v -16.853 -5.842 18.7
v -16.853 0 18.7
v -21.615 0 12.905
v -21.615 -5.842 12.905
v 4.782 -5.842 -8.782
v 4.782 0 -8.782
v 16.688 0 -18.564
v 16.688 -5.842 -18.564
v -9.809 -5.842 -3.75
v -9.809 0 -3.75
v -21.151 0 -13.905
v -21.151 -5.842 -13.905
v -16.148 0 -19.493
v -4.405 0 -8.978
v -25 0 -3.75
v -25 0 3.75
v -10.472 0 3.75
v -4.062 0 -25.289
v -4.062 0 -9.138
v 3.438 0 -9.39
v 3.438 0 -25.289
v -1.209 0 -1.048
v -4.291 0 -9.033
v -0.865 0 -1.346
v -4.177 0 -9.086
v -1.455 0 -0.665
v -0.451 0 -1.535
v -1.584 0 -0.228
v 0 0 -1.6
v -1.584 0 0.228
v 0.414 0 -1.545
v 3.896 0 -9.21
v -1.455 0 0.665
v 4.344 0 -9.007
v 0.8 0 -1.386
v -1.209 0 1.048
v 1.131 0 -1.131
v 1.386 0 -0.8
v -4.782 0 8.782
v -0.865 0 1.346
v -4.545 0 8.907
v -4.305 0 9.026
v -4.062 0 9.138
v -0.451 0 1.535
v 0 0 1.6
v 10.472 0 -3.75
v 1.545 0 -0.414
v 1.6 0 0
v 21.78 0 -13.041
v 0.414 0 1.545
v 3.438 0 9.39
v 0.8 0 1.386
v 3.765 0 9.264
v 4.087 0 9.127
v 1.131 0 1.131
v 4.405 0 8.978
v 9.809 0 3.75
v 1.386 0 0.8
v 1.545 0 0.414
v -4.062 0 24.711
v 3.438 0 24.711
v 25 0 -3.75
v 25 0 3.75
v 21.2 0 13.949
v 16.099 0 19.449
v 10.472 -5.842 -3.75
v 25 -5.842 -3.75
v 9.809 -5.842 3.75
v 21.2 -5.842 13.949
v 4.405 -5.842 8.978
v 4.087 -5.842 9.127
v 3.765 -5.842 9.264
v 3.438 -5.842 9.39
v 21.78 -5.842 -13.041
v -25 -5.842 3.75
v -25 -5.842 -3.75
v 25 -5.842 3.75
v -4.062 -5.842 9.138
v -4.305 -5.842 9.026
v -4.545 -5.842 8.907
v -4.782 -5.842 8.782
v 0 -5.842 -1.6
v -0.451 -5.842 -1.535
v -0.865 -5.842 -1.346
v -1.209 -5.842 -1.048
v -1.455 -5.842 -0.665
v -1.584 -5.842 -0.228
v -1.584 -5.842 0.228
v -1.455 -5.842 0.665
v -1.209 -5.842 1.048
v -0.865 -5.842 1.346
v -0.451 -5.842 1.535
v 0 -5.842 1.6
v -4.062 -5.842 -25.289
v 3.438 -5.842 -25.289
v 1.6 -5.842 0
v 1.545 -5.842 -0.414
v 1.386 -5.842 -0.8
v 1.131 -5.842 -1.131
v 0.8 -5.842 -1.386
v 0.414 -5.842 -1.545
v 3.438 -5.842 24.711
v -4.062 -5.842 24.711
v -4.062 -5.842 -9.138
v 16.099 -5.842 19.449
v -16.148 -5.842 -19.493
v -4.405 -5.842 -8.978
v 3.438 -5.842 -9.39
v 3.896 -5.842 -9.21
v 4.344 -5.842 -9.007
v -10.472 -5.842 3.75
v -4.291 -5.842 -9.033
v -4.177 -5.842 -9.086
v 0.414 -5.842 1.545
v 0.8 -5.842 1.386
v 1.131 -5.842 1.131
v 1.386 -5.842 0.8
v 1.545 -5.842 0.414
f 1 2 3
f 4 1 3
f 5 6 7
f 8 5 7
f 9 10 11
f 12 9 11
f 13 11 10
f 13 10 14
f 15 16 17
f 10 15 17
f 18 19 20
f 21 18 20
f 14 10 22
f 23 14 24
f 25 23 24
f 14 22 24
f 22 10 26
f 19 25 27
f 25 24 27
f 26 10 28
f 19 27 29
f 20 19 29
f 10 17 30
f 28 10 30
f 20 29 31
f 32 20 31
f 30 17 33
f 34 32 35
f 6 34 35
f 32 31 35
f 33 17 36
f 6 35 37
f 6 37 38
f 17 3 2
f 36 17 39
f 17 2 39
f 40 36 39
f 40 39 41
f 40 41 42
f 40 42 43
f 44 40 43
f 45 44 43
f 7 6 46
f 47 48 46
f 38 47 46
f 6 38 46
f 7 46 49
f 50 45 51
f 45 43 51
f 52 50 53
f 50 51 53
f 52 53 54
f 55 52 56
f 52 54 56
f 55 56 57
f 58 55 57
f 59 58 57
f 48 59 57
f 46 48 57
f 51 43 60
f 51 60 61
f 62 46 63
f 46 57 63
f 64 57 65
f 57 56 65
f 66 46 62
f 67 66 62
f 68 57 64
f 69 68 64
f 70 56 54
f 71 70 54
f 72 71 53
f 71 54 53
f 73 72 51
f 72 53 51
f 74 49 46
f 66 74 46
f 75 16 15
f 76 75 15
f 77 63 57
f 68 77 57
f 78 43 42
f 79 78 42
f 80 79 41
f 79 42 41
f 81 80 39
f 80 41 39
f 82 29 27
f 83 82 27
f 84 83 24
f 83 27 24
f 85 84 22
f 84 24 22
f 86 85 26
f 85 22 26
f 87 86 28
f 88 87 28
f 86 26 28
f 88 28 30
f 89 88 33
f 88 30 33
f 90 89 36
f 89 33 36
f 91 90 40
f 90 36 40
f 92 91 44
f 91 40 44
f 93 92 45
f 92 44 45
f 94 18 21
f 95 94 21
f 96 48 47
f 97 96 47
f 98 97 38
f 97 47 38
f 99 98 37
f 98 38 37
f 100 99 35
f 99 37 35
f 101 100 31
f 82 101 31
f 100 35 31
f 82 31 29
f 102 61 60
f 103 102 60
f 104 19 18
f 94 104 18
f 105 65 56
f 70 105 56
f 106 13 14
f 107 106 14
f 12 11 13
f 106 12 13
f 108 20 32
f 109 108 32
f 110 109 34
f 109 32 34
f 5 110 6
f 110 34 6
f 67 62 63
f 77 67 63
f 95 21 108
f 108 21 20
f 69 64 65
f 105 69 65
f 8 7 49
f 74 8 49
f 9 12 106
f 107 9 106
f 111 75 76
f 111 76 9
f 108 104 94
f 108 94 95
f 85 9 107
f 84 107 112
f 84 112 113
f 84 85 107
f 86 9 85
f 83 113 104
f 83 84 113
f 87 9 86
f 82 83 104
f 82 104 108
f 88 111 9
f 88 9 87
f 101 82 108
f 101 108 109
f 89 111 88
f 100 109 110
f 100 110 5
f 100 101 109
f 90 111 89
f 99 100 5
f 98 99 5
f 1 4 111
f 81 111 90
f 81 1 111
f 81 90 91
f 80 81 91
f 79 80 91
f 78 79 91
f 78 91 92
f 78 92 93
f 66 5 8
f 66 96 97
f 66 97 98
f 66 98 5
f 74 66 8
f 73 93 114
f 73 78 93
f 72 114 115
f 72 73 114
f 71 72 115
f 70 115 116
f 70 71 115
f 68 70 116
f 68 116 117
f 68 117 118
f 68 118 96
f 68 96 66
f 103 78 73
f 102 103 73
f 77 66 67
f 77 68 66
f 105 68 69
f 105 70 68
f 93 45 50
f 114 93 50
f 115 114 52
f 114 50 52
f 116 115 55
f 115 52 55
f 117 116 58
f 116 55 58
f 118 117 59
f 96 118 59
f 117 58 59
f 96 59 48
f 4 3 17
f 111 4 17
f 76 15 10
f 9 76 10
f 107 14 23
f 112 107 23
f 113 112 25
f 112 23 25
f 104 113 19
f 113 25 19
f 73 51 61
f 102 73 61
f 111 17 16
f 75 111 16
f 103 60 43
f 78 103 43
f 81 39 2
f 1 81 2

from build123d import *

# Parameters (mm, degrees)
F1_DEPTH = 5.842


with BuildPart() as f1:
    # F0 (on Front) → F1 (new body)
    with BuildSketch(Plane.XZ):
        with BuildLine():
            ThreePointArc((9.5433378796, -2.9874239932), (9.8851752336, -1.5110627392), (10, 0))
            ThreePointArc((10, 0), (9.8508269436, 1.7208162387), (9.4077582946, 3.3902925937))
            Line((9.4077582946, 3.3902925937), (5.7582254442, 0.1224102397))
            Line((5.7582254442, 0.1224102397), (9.5433378796, -2.9874239932))
        make_face()
        with BuildLine():
            ThreePointArc((9.4077582946, 3.3902925937), (9.8508269436, 1.7208162387), (10, 0))
            ThreePointArc((10, 0), (9.8851752336, -1.5110627392), (9.5433378796, -2.9874239932))
            Line((9.5433378796, -2.9874239932), (10.4715017977, -3.75))
            Line((10.4715017977, -3.75), (25, -3.75))
            Line((25, -3.75), (25, 3.75))
            Line((25, 3.75), (9.8094753252, 3.75))
            Line((9.8094753252, 3.75), (9.4077582946, 3.3902925937))
        make_face()
        with BuildLine():
            Line((5.7582254442, 0.1224102397), (9.4077582946, 3.3902925937))
            ThreePointArc((9.4077582946, 3.3902925937), (9.3407348831, 3.57080829), (9.2702481089, 3.75))
            Line((9.2702481089, 3.75), (3.43801843, 3.75))
            Line((3.43801843, 3.75), (3.43801843, 2.0286836526))
            Line((3.43801843, 2.0286836526), (5.7582254442, 0.1224102397))
        make_face()
        with BuildLine():
            ThreePointArc((9.2702481089, 3.75), (9.3407348831, 3.57080829), (9.4077582946, 3.3902925937))
            Line((9.4077582946, 3.3902925937), (9.8094753252, 3.75))
            Line((9.8094753252, 3.75), (9.2702481089, 3.75))
        make_face()
        with BuildLine():
            Line((10.4715017977, -3.75), (9.5433378796, -2.9874239932))
            ThreePointArc((9.5433378796, -2.9874239932), (9.4145172462, -3.3714781657), (9.2702481089, -3.75))
            Line((9.2702481089, -3.75), (10.4715017977, -3.75))
        make_face()
        with BuildLine():
            ThreePointArc((9.2702481089, -3.75), (9.4145172462, -3.3714781657), (9.5433378796, -2.9874239932))
            Line((9.5433378796, -2.9874239932), (5.7582254442, 0.1224102397))
            Line((5.7582254442, 0.1224102397), (3.43801843, -1.9551607454))
            Line((3.43801843, -1.9551607454), (3.43801843, -3.75))
            Line((3.43801843, -3.75), (9.2702481089, -3.75))
        make_face()
        with BuildLine():
            Line((3.43801843, 3.75), (9.2702481089, 3.75))
            ThreePointArc((9.2702481089, 3.75), (7.3200398798, 6.8130034609), (4.4046622613, 8.9776918172))
            Line((4.4046622613, 8.9776918172), (3.43801843, 8.1121349231))
            Line((3.43801843, 8.1121349231), (3.43801843, 3.75))
        make_face()
        with BuildLine():
            ThreePointArc((4.4046622613, 8.9776918172), (7.3200398798, 6.8130034609), (9.2702481089, 3.75))
            Line((9.2702481089, 3.75), (9.8094753252, 3.75))
            Line((9.8094753252, 3.75), (21.1996483638, 13.9490438251))
            Line((21.1996483638, 13.9490438251), (16.0986373051, 19.4487675029))
            Line((16.0986373051, 19.4487675029), (4.4046622613, 8.9776918172))
        make_face()
        Polygon((3.43801843, -1.9551607454), (5.7582254442, 0.1224102397), (3.43801843, 2.0286836526), align=None)
        with BuildLine():
            Line((10.4715017977, -3.75), (9.2702481089, -3.75))
            ThreePointArc((9.2702481089, -3.75), (7.4631867576, -6.6558878763), (4.7822119792, -8.7823942399))
            Line((4.7822119792, -8.7823942399), (16.6882236685, -18.5643289542))
            Line((16.6882236685, -18.5643289542), (21.7797240627, -13.0407931571))
            Line((21.7797240627, -13.0407931571), (10.4715017977, -3.75))
        make_face()
        with BuildLine():
            ThreePointArc((4.7822119792, -8.7823942399), (7.4631867576, -6.6558878763), (9.2702481089, -3.75))
            Line((9.2702481089, -3.75), (3.43801843, -3.75))
            Line((3.43801843, -3.75), (3.43801843, -7.6780098428))
            Line((3.43801843, -7.6780098428), (4.7822119792, -8.7823942399))
        make_face()
        with BuildLine():
            Line((3.43801843, 8.1121349231), (4.4046622613, 8.9776918172))
            ThreePointArc((4.4046622613, 8.9776918172), (3.926766698, 9.1967659152), (3.43801843, 9.3904222096))
            Line((3.43801843, 9.3904222096), (3.43801843, 8.1121349231))
        make_face()
        Polygon((1.3429305817, 3.75), (3.43801843, 3.75), (3.43801843, 8.1121349231), (-0.1050080786, 4.9396209927), align=None)
        Polygon((3.43801843, 2.0286836526), (3.43801843, 3.75), (1.3429305817, 3.75), align=None)
        Polygon((1.4335629107, -3.75), (3.43801843, -1.9551607454), (3.43801843, 2.0286836526), (1.3429305817, 3.75), (-1.4335629107, 3.75), (-4.06198157, 1.3964486531), (-4.06198157, -1.5160378684), (-1.3429305817, -3.75), align=None)
        with BuildLine():
            ThreePointArc((0, 1.6), (1.1313708499, 1.1313708499), (1.6, 0))
            ThreePointArc((1.6, 0), (1.1313708499, -1.1313708499), (0, -1.6))
            ThreePointArc((0, -1.6), (-1.6, 0), (0, 1.6))
        make_face(mode=Mode.SUBTRACT)
        Polygon((3.43801843, -3.75), (3.43801843, -1.9551607454), (1.4335629107, -3.75), align=None)
        with BuildLine():
            ThreePointArc((3.43801843, -9.3904222096), (4.1213434094, -9.1112308994), (4.7822119792, -8.7823942399))
            Line((4.7822119792, -8.7823942399), (3.43801843, -7.6780098428))
            Line((3.43801843, -7.6780098428), (3.43801843, -9.3904222096))
        make_face()
        Polygon((3.43801843, -7.6780098428), (3.43801843, -3.75), (1.4335629107, -3.75), (0.1050080786, -4.9396209927), align=None)
        with BuildLine():
            Line((3.43801843, 8.1121349231), (3.43801843, 9.3904222096))
            ThreePointArc((3.43801843, 9.3904222096), (-0.3365719222, 9.9943343621), (-4.06198157, 9.1378501698))
            Line((-4.06198157, 9.1378501698), (-4.06198157, 8.190655627))
            Line((-4.06198157, 8.190655627), (-0.1050080786, 4.9396209927))
            Line((-0.1050080786, 4.9396209927), (3.43801843, 8.1121349231))
        make_face()
        with BuildLine():
            ThreePointArc((-4.06198157, 9.1378501698), (-0.3365719222, 9.9943343621), (3.43801843, 9.3904222096))
            Line((3.43801843, 9.3904222096), (3.43801843, 24.7108984739))
            Line((3.43801843, 24.7108984739), (-4.06198157, 24.7108984739))
            Line((-4.06198157, 24.7108984739), (-4.06198157, 9.1378501698))
        make_face()
        Polygon((-1.4335629107, 3.75), (1.3429305817, 3.75), (-0.1050080786, 4.9396209927), align=None)
        Polygon((0.1050080786, -4.9396209927), (1.4335629107, -3.75), (-1.3429305817, -3.75), align=None)
        with BuildLine():
            Line((3.43801843, -25.2891015261), (3.43801843, -9.3904222096))
            ThreePointArc((3.43801843, -9.3904222096), (-0.3365719222, -9.9943343621), (-4.06198157, -9.1378501698))
            Line((-4.06198157, -9.1378501698), (-4.06198157, -25.2891015261))
            Line((-4.06198157, -25.2891015261), (3.43801843, -25.2891015261))
        make_face()
        with BuildLine():
            ThreePointArc((-4.06198157, -9.1378501698), (-0.3365719222, -9.9943343621), (3.43801843, -9.3904222096))
            Line((3.43801843, -9.3904222096), (3.43801843, -7.6780098428))
            Line((3.43801843, -7.6780098428), (0.1050080786, -4.9396209927))
            Line((0.1050080786, -4.9396209927), (-4.06198157, -8.6708470153))
            Line((-4.06198157, -8.6708470153), (-4.06198157, -9.1378501698))
        make_face()
        with BuildLine():
            Line((-4.06198157, 8.190655627), (-4.06198157, 9.1378501698))
            ThreePointArc((-4.06198157, 9.1378501698), (-4.4256668552, 8.9673559585), (-4.7822119792, 8.7823942399))
            Line((-4.7822119792, 8.7823942399), (-4.06198157, 8.190655627))
        make_face()
        Polygon((-1.4335629107, 3.75), (-0.1050080786, 4.9396209927), (-4.06198157, 8.190655627), (-4.06198157, 3.75), align=None)
        Polygon((-4.06198157, 1.3964486531), (-1.4335629107, 3.75), (-4.06198157, 3.75), align=None)
        Polygon((-4.06198157, -8.6708470153), (0.1050080786, -4.9396209927), (-1.3429305817, -3.75), (-4.06198157, -3.75), align=None)
        Polygon((-4.06198157, -3.75), (-1.3429305817, -3.75), (-4.06198157, -1.5160378684), align=None)
        with BuildLine():
            ThreePointArc((-4.4046622613, -8.9776918172), (-4.2340792524, -9.0593914191), (-4.06198157, -9.1378501698))
            Line((-4.06198157, -9.1378501698), (-4.06198157, -8.6708470153))
            Line((-4.06198157, -8.6708470153), (-4.4046622613, -8.9776918172))
        make_face()
        with BuildLine():
            Line((-4.06198157, 8.190655627), (-4.7822119792, 8.7823942399))
            ThreePointArc((-4.7822119792, 8.7823942399), (-7.4631867576, 6.6558878763), (-9.2702481089, 3.75))
            Line((-9.2702481089, 3.75), (-4.06198157, 3.75))
            Line((-4.06198157, 3.75), (-4.06198157, 8.190655627))
        make_face()
        with BuildLine():
            ThreePointArc((-9.2702481089, 3.75), (-7.4631867576, 6.6558878763), (-4.7822119792, 8.7823942399))
            Line((-4.7822119792, 8.7823942399), (-16.8534109154, 18.700046179))
            Line((-16.8534109154, 18.700046179), (-21.6145368158, 12.9050759323))
            Line((-21.6145368158, 12.9050759323), (-10.4715017977, 3.75))
            Line((-10.4715017977, 3.75), (-9.2702481089, 3.75))
        make_face()
        with BuildLine():
            Line((-5.7582254442, -0.1224102397), (-4.06198157, 1.3964486531))
            Line((-4.06198157, 1.3964486531), (-4.06198157, 3.75))
            Line((-4.06198157, 3.75), (-9.2702481089, 3.75))
            ThreePointArc((-9.2702481089, 3.75), (-9.4145172462, 3.3714781657), (-9.5433378796, 2.9874239932))
            Line((-9.5433378796, 2.9874239932), (-5.7582254442, -0.1224102397))
        make_face()
        Polygon((-4.06198157, -1.5160378684), (-4.06198157, 1.3964486531), (-5.7582254442, -0.1224102397), align=None)
        with BuildLine():
            Line((-4.4046622613, -8.9776918172), (-4.06198157, -8.6708470153))
            Line((-4.06198157, -8.6708470153), (-4.06198157, -3.75))
            Line((-4.06198157, -3.75), (-9.2702481089, -3.75))
            ThreePointArc((-9.2702481089, -3.75), (-7.3200398798, -6.8130034609), (-4.4046622613, -8.9776918172))
        make_face()
        with BuildLine():
            Line((-9.2702481089, -3.75), (-4.06198157, -3.75))
            Line((-4.06198157, -3.75), (-4.06198157, -1.5160378684))
            Line((-4.06198157, -1.5160378684), (-5.7582254442, -0.1224102397))
            Line((-5.7582254442, -0.1224102397), (-9.4077582946, -3.3902925937))
            ThreePointArc((-9.4077582946, -3.3902925937), (-9.3407348831, -3.57080829), (-9.2702481089, -3.75))
        make_face()
        with BuildLine():
            Line((-16.1475948178, -19.4926052757), (-4.4046622613, -8.9776918172))
            ThreePointArc((-4.4046622613, -8.9776918172), (-7.3200398798, -6.8130034609), (-9.2702481089, -3.75))
            Line((-9.2702481089, -3.75), (-9.8094753252, -3.75))
            Line((-9.8094753252, -3.75), (-21.1506908511, -13.9052060523))
            Line((-21.1506908511, -13.9052060523), (-16.1475948178, -19.4926052757))
        make_face()
        with BuildLine():
            ThreePointArc((-9.5433378796, 2.9874239932), (-9.4145172462, 3.3714781657), (-9.2702481089, 3.75))
            Line((-9.2702481089, 3.75), (-10.4715017977, 3.75))
            Line((-10.4715017977, 3.75), (-9.5433378796, 2.9874239932))
        make_face()
        with BuildLine():
            Line((-9.4077582946, -3.3902925937), (-5.7582254442, -0.1224102397))
            Line((-5.7582254442, -0.1224102397), (-9.5433378796, 2.9874239932))
            ThreePointArc((-9.5433378796, 2.9874239932), (-9.9977411832, -0.2125352519), (-9.4077582946, -3.3902925937))
        make_face()
        with BuildLine():
            Line((-9.8094753252, -3.75), (-9.2702481089, -3.75))
            ThreePointArc((-9.2702481089, -3.75), (-9.3407348831, -3.57080829), (-9.4077582946, -3.3902925937))
            Line((-9.4077582946, -3.3902925937), (-9.8094753252, -3.75))
        make_face()
        with BuildLine():
            ThreePointArc((-9.4077582946, -3.3902925937), (-9.9977411832, -0.2125352519), (-9.5433378796, 2.9874239932))
            Line((-9.5433378796, 2.9874239932), (-10.4715017977, 3.75))
            Line((-10.4715017977, 3.75), (-25, 3.75))
            Line((-25, 3.75), (-25, -3.75))
            Line((-25, -3.75), (-9.8094753252, -3.75))
            Line((-9.8094753252, -3.75), (-9.4077582946, -3.3902925937))
        make_face()
    extrude(amount=F1_DEPTH)


solid = f1.part
